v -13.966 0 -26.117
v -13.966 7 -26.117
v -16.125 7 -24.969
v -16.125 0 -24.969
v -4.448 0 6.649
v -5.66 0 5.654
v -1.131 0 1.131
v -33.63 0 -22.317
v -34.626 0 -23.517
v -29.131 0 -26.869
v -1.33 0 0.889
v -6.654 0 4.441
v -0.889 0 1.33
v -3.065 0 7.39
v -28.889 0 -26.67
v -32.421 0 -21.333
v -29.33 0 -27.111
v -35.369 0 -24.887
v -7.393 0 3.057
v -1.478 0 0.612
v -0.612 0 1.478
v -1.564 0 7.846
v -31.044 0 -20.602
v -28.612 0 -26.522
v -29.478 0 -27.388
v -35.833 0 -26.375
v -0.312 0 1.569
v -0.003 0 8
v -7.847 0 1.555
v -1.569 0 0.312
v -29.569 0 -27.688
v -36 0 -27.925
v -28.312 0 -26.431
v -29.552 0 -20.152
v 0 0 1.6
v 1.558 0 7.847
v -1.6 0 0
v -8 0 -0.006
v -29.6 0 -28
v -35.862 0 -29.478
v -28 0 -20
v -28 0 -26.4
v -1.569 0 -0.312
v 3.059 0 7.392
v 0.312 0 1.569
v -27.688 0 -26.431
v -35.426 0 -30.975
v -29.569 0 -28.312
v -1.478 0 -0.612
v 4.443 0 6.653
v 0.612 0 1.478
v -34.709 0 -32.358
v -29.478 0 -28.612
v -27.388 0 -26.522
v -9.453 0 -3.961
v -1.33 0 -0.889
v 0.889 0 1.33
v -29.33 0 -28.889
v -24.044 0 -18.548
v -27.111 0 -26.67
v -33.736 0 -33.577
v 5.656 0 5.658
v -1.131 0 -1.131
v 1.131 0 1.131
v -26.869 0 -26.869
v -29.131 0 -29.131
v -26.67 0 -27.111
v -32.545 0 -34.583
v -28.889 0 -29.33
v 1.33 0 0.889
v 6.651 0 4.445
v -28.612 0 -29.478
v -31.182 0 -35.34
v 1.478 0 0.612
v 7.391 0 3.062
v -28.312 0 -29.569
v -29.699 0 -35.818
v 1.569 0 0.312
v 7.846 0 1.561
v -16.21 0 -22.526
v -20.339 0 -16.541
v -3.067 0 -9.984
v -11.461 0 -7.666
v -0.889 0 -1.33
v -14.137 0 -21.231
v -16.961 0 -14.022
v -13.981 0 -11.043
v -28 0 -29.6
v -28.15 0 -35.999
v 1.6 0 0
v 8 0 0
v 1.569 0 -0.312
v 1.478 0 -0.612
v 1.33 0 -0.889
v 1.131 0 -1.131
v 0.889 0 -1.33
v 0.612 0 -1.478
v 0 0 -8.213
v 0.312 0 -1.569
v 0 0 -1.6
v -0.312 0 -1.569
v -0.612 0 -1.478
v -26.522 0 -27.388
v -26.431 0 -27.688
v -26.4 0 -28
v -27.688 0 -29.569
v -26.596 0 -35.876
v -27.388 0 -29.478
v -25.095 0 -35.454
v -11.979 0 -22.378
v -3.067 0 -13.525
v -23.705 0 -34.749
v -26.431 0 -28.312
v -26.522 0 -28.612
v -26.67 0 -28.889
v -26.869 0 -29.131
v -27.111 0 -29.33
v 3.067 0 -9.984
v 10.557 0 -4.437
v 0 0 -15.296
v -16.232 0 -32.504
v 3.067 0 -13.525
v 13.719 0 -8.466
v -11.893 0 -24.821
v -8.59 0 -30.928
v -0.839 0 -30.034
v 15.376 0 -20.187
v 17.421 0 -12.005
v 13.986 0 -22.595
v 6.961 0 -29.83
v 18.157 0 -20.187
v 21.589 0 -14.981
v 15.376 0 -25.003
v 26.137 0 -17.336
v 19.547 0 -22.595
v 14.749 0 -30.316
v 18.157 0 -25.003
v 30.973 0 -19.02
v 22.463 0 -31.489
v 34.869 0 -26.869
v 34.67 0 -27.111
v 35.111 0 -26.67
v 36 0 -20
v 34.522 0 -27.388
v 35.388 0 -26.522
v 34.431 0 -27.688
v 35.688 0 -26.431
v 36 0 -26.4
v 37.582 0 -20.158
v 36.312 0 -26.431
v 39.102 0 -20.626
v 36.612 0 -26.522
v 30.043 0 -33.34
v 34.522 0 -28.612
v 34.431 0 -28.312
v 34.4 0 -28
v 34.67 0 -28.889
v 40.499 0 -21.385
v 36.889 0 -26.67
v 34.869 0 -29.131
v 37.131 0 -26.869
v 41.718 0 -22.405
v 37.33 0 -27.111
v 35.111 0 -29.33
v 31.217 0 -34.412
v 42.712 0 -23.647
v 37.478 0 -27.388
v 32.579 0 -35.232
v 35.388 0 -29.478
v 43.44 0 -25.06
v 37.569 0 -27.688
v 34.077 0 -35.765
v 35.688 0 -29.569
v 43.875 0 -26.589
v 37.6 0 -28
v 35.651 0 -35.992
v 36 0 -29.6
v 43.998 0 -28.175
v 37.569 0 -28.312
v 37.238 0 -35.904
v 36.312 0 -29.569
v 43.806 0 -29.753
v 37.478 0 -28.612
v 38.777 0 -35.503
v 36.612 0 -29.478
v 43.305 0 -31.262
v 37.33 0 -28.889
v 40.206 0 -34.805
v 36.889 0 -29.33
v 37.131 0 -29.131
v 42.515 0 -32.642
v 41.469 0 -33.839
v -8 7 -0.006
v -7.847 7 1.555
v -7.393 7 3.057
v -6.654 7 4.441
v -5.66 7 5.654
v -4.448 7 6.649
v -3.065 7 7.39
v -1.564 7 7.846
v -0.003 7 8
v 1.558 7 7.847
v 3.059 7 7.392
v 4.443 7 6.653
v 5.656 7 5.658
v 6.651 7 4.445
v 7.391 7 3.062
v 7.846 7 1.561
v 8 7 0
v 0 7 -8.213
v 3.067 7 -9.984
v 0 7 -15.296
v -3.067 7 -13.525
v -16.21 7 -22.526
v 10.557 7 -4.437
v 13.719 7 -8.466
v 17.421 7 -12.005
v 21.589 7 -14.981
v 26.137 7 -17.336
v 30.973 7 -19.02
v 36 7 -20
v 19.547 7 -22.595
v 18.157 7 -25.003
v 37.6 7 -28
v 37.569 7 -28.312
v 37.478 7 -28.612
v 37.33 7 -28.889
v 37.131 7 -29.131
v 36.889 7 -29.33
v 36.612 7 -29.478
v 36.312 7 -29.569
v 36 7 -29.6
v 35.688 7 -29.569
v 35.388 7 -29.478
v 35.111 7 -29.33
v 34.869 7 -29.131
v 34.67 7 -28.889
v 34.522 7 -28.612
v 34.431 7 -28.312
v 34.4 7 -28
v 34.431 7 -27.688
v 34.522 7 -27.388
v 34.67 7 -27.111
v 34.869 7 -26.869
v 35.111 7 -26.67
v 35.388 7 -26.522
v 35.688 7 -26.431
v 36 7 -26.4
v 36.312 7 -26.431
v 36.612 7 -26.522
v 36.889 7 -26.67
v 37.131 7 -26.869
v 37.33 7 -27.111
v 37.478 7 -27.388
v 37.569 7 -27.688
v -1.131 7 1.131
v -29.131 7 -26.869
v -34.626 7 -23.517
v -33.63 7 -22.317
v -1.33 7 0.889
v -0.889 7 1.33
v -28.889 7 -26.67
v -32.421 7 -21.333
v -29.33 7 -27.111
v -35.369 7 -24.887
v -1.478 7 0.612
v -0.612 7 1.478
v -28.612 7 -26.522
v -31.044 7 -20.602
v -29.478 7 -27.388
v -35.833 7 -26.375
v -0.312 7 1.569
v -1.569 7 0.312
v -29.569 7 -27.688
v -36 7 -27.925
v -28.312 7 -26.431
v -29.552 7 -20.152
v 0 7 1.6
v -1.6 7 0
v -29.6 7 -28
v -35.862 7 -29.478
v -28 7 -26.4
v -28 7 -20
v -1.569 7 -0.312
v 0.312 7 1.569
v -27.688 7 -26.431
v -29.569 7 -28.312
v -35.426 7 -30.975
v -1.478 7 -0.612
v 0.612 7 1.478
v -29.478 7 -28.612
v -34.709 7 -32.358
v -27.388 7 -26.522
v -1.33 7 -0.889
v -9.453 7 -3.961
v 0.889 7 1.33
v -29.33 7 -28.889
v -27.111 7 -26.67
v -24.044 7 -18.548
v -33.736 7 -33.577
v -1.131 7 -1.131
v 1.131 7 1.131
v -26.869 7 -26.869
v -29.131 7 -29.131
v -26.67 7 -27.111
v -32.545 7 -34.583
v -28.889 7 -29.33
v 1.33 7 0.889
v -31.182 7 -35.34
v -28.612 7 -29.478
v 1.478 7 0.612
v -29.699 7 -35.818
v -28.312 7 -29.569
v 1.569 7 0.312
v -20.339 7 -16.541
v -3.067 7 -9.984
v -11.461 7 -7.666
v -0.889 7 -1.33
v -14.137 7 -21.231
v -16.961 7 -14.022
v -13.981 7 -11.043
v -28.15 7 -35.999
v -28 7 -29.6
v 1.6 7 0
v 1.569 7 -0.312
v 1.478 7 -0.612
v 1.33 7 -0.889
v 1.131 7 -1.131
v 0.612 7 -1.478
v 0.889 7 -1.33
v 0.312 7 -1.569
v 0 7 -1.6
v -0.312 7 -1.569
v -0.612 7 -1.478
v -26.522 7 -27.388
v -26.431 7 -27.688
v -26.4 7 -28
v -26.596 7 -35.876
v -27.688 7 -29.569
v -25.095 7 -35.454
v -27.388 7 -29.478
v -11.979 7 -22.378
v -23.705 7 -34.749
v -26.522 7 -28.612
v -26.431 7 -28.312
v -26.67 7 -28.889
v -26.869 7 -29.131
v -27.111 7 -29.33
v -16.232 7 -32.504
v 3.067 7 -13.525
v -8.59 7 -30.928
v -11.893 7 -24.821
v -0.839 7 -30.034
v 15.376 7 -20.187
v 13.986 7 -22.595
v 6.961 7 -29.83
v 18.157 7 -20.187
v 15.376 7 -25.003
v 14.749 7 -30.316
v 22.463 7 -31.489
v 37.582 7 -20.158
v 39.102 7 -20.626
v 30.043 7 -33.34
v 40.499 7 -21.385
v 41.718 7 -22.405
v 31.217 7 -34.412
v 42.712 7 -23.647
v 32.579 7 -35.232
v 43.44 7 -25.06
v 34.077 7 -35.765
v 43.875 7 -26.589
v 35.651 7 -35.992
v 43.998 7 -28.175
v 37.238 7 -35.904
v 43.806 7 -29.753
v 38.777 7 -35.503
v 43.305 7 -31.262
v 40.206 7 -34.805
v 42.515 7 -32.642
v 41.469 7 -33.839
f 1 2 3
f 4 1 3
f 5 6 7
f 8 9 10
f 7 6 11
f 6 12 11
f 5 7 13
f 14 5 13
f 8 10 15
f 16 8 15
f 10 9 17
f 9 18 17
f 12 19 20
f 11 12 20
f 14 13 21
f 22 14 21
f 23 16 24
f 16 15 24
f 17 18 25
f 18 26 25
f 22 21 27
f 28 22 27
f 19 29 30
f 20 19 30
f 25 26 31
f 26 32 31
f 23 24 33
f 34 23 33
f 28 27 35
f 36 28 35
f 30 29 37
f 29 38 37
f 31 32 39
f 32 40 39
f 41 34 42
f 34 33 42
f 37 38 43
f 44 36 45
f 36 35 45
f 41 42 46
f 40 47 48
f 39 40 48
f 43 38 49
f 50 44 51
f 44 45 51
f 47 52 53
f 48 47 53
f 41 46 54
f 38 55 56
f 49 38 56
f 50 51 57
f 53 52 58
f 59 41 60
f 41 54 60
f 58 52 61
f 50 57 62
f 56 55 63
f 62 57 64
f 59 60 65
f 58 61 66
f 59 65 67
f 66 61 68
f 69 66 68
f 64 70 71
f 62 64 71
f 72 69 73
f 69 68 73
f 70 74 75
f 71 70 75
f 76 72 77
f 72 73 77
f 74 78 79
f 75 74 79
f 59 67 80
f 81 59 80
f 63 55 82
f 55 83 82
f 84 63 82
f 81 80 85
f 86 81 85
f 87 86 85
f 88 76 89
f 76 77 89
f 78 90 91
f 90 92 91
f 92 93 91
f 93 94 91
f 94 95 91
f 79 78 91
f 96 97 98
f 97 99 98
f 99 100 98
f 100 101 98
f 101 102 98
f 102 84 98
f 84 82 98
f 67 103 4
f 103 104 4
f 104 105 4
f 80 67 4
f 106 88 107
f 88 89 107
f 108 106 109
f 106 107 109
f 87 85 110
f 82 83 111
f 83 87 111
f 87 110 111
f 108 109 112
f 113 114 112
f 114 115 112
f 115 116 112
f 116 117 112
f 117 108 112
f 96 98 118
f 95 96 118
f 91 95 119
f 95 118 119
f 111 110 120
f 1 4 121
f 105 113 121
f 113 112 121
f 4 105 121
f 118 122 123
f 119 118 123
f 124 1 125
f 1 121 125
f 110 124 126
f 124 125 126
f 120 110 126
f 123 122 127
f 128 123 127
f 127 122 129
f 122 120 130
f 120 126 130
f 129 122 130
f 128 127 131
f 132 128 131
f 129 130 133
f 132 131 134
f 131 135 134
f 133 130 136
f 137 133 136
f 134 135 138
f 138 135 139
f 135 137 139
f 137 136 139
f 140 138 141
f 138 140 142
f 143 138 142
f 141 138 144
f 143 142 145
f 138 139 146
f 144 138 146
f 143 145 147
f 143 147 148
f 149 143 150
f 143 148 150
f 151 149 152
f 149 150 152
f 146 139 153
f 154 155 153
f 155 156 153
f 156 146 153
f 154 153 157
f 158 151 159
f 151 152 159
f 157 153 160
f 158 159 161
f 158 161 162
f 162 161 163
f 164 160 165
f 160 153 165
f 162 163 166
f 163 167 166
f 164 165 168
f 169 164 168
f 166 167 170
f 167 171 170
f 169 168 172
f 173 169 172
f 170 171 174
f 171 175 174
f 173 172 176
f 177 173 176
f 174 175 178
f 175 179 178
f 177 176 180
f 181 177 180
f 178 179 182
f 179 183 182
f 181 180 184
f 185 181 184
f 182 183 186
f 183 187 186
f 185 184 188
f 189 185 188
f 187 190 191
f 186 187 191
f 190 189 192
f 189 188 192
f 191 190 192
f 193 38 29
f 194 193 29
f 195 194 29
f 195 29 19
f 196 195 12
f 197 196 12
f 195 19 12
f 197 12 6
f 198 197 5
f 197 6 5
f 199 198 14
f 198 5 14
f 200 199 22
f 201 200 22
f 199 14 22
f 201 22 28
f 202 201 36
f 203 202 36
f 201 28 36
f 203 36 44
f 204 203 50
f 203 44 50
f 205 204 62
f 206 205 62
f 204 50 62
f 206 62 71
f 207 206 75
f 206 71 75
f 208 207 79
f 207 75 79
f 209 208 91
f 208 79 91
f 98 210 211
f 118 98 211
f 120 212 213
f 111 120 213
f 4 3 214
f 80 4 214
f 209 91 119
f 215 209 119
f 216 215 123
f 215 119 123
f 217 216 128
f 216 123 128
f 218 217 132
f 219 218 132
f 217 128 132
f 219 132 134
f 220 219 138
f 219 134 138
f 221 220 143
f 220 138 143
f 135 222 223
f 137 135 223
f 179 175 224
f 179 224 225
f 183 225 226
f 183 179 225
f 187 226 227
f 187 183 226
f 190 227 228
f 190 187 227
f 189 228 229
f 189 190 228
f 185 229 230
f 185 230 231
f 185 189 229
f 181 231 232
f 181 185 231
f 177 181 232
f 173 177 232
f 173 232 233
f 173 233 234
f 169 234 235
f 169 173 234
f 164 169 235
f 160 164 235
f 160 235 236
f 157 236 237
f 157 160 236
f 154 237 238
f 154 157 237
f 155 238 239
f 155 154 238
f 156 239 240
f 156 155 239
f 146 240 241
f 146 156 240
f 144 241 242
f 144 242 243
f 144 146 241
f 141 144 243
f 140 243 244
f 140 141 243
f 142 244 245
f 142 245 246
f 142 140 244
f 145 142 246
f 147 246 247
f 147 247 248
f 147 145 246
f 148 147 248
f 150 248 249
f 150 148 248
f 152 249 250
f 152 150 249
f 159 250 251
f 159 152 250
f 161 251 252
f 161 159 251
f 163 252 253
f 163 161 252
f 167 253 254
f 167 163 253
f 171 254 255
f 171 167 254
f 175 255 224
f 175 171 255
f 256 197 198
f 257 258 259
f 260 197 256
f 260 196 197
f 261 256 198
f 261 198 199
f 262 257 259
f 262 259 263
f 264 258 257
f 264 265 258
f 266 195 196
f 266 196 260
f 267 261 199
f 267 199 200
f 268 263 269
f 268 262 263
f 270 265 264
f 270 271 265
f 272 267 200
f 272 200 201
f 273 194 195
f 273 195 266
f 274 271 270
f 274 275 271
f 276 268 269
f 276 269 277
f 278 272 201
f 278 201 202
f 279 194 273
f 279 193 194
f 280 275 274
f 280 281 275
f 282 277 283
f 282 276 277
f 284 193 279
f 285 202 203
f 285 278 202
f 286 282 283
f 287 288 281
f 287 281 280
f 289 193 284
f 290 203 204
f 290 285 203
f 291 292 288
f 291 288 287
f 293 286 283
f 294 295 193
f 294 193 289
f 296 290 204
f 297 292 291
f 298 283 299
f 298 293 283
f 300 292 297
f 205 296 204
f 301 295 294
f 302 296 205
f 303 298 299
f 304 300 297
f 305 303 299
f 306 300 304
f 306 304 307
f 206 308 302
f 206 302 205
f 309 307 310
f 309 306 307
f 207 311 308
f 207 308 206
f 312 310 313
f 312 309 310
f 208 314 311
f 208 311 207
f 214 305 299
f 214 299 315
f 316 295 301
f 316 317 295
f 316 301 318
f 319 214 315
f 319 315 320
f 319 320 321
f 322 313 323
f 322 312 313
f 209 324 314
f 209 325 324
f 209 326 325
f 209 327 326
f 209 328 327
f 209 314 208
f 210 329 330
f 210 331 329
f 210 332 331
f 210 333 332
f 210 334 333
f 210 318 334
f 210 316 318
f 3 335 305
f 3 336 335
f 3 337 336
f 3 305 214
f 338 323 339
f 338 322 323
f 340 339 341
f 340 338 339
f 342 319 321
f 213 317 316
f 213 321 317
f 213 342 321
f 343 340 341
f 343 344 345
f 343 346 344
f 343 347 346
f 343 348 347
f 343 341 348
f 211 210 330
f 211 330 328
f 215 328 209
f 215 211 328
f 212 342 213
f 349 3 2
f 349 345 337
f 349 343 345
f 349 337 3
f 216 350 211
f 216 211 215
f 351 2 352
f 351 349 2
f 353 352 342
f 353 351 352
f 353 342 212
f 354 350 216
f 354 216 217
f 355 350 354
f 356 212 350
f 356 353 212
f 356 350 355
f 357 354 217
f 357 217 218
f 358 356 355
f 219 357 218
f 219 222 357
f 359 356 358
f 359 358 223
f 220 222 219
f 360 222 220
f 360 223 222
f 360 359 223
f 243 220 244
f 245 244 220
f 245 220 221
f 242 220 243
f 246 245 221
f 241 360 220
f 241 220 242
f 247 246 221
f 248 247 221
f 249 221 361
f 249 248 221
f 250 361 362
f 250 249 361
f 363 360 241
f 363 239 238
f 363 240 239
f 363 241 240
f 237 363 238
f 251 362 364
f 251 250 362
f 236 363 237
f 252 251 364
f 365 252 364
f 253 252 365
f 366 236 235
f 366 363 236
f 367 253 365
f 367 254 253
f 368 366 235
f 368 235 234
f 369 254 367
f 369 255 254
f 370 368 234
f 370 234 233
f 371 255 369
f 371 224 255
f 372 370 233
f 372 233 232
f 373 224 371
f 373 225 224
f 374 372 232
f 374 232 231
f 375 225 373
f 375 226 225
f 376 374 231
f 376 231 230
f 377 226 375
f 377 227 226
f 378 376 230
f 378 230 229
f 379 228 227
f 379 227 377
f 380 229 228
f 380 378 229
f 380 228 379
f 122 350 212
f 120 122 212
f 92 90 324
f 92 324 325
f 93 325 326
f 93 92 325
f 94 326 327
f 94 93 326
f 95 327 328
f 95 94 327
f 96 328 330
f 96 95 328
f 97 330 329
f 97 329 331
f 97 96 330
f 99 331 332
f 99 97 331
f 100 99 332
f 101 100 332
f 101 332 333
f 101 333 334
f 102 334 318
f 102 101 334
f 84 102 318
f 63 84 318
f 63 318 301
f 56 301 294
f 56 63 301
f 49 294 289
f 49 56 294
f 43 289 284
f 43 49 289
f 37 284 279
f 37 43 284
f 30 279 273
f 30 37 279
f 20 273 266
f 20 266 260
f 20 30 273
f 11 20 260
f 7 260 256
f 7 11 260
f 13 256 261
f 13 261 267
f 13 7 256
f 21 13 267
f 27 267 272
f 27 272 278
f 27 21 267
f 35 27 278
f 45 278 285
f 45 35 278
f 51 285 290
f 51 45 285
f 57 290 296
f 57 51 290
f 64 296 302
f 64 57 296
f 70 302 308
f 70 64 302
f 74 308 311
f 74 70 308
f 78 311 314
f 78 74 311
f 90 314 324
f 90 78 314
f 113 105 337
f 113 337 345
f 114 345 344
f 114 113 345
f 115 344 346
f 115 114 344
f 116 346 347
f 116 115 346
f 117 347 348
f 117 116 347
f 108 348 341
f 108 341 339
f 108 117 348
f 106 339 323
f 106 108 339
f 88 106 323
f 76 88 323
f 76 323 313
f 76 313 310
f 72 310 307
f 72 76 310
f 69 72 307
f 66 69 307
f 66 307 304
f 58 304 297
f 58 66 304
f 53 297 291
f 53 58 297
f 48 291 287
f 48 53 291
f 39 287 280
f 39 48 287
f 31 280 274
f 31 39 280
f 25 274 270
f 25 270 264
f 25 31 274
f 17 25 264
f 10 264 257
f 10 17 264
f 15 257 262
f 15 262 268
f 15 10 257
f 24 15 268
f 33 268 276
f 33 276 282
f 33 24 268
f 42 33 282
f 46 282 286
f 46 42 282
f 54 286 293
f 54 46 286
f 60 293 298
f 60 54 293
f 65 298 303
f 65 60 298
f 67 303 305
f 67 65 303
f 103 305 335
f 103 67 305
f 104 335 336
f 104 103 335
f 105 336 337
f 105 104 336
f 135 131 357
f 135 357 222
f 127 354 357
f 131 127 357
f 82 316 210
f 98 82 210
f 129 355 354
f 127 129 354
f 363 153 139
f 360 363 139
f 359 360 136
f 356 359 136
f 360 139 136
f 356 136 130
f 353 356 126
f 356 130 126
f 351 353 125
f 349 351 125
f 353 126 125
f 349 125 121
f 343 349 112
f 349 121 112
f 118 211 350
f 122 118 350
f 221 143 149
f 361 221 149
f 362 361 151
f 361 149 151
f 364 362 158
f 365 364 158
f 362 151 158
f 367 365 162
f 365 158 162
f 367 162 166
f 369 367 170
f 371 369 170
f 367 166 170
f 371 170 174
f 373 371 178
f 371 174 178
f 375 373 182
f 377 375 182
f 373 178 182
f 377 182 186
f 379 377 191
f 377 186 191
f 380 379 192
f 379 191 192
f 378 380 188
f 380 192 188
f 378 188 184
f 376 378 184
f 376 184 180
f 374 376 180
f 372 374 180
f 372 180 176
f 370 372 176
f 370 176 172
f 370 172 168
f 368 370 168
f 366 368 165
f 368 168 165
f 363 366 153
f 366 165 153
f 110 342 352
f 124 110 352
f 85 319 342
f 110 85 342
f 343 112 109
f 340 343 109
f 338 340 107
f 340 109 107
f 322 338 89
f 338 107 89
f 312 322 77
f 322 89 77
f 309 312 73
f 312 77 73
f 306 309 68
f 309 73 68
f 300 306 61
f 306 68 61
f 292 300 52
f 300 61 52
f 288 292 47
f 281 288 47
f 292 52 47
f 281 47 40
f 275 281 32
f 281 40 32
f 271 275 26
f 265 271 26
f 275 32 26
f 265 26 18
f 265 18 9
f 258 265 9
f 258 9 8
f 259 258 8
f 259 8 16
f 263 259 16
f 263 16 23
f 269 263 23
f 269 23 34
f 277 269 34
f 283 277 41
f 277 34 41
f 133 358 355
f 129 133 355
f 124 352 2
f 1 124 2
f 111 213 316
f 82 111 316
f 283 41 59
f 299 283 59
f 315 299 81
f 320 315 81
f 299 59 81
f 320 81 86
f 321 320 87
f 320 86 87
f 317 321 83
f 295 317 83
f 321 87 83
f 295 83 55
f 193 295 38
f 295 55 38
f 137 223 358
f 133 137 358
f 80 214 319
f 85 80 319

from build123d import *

# Parameters (mm, degrees)
BOSS_EXTRUDE2_OUTLINE_R = 1.6
BOSS_EXTRUDE2_DEPTH     = 7
CUT_EXTRUDE1_DEPTH      = 58.280013967


# Read off the part's stored shape, not the designer's step: Boss-Extrude2
with BuildPart() as part:
    # Boss-Extrude2 outline → Boss-Extrude2 (new body)
    with BuildSketch(Plane(origin=(0, 0, 0), x_dir=(1, 0, 0), z_dir=(0, 1, 0))):
        with BuildLine():
            ThreePointArc((36, 20), (43.304735803, 31.262029255), (30.042934529, 33.339791286))
            ThreePointArc((30.042934529, 33.339791286), (3.05899236, 29.845703842), (-23.704753961, 34.749137831))
            ThreePointArc((-23.704753961, 34.749137831), (-35.680921255, 30.236838992), (-28, 20))
            ThreePointArc((-28, 20), (-15.417509156, 12.586209164), (-7.999997816, 0.005911236))
            ThreePointArc((-7.999997816, 0.005911236), (-0.002955618, -7.999999454), (8, 0))
            ThreePointArc((8, 0), (19.451858394, 13.567398249), (36, 20))
        make_face()
        Circle(BOSS_EXTRUDE2_OUTLINE_R, mode=Mode.SUBTRACT)
        with Locations((-28, 28)):
            Circle(BOSS_EXTRUDE2_OUTLINE_R, mode=Mode.SUBTRACT)
        with Locations((36, 28)):
            Circle(BOSS_EXTRUDE2_OUTLINE_R, mode=Mode.SUBTRACT)
    extrude(amount=BOSS_EXTRUDE2_DEPTH)

    # Sketch5 → Cut-Extrude1 (cut, through all)
    with BuildSketch(Plane(origin=(0, 7, 0), x_dir=(1, 0, 0), z_dir=(0, 1, 0))):
        Polygon((-11.978854601, 22.378102142), (-11.893313223, 24.821105741), (-13.966245712, 26.116688546), (-16.124719579, 24.969267753), (-16.210260957, 22.526264155), (-14.137328468, 21.230681349), align=None)
        Polygon((19.546993666, 22.594588654), (18.156731561, 25.002593256), (15.37620735, 25.002593256), (13.985945245, 22.594588654), (15.37620735, 20.186584052), (18.156731561, 20.186584052), align=None)
        Polygon((0, 8.213063469), (3.066820834, 9.983693303), (3.066820834, 13.524952971), (0, 15.295582806), (-3.066820834, 13.524952971), (-3.066820834, 9.983693303), align=None)
    extrude(amount=-CUT_EXTRUDE1_DEPTH, mode=Mode.SUBTRACT)


solid = part.part
